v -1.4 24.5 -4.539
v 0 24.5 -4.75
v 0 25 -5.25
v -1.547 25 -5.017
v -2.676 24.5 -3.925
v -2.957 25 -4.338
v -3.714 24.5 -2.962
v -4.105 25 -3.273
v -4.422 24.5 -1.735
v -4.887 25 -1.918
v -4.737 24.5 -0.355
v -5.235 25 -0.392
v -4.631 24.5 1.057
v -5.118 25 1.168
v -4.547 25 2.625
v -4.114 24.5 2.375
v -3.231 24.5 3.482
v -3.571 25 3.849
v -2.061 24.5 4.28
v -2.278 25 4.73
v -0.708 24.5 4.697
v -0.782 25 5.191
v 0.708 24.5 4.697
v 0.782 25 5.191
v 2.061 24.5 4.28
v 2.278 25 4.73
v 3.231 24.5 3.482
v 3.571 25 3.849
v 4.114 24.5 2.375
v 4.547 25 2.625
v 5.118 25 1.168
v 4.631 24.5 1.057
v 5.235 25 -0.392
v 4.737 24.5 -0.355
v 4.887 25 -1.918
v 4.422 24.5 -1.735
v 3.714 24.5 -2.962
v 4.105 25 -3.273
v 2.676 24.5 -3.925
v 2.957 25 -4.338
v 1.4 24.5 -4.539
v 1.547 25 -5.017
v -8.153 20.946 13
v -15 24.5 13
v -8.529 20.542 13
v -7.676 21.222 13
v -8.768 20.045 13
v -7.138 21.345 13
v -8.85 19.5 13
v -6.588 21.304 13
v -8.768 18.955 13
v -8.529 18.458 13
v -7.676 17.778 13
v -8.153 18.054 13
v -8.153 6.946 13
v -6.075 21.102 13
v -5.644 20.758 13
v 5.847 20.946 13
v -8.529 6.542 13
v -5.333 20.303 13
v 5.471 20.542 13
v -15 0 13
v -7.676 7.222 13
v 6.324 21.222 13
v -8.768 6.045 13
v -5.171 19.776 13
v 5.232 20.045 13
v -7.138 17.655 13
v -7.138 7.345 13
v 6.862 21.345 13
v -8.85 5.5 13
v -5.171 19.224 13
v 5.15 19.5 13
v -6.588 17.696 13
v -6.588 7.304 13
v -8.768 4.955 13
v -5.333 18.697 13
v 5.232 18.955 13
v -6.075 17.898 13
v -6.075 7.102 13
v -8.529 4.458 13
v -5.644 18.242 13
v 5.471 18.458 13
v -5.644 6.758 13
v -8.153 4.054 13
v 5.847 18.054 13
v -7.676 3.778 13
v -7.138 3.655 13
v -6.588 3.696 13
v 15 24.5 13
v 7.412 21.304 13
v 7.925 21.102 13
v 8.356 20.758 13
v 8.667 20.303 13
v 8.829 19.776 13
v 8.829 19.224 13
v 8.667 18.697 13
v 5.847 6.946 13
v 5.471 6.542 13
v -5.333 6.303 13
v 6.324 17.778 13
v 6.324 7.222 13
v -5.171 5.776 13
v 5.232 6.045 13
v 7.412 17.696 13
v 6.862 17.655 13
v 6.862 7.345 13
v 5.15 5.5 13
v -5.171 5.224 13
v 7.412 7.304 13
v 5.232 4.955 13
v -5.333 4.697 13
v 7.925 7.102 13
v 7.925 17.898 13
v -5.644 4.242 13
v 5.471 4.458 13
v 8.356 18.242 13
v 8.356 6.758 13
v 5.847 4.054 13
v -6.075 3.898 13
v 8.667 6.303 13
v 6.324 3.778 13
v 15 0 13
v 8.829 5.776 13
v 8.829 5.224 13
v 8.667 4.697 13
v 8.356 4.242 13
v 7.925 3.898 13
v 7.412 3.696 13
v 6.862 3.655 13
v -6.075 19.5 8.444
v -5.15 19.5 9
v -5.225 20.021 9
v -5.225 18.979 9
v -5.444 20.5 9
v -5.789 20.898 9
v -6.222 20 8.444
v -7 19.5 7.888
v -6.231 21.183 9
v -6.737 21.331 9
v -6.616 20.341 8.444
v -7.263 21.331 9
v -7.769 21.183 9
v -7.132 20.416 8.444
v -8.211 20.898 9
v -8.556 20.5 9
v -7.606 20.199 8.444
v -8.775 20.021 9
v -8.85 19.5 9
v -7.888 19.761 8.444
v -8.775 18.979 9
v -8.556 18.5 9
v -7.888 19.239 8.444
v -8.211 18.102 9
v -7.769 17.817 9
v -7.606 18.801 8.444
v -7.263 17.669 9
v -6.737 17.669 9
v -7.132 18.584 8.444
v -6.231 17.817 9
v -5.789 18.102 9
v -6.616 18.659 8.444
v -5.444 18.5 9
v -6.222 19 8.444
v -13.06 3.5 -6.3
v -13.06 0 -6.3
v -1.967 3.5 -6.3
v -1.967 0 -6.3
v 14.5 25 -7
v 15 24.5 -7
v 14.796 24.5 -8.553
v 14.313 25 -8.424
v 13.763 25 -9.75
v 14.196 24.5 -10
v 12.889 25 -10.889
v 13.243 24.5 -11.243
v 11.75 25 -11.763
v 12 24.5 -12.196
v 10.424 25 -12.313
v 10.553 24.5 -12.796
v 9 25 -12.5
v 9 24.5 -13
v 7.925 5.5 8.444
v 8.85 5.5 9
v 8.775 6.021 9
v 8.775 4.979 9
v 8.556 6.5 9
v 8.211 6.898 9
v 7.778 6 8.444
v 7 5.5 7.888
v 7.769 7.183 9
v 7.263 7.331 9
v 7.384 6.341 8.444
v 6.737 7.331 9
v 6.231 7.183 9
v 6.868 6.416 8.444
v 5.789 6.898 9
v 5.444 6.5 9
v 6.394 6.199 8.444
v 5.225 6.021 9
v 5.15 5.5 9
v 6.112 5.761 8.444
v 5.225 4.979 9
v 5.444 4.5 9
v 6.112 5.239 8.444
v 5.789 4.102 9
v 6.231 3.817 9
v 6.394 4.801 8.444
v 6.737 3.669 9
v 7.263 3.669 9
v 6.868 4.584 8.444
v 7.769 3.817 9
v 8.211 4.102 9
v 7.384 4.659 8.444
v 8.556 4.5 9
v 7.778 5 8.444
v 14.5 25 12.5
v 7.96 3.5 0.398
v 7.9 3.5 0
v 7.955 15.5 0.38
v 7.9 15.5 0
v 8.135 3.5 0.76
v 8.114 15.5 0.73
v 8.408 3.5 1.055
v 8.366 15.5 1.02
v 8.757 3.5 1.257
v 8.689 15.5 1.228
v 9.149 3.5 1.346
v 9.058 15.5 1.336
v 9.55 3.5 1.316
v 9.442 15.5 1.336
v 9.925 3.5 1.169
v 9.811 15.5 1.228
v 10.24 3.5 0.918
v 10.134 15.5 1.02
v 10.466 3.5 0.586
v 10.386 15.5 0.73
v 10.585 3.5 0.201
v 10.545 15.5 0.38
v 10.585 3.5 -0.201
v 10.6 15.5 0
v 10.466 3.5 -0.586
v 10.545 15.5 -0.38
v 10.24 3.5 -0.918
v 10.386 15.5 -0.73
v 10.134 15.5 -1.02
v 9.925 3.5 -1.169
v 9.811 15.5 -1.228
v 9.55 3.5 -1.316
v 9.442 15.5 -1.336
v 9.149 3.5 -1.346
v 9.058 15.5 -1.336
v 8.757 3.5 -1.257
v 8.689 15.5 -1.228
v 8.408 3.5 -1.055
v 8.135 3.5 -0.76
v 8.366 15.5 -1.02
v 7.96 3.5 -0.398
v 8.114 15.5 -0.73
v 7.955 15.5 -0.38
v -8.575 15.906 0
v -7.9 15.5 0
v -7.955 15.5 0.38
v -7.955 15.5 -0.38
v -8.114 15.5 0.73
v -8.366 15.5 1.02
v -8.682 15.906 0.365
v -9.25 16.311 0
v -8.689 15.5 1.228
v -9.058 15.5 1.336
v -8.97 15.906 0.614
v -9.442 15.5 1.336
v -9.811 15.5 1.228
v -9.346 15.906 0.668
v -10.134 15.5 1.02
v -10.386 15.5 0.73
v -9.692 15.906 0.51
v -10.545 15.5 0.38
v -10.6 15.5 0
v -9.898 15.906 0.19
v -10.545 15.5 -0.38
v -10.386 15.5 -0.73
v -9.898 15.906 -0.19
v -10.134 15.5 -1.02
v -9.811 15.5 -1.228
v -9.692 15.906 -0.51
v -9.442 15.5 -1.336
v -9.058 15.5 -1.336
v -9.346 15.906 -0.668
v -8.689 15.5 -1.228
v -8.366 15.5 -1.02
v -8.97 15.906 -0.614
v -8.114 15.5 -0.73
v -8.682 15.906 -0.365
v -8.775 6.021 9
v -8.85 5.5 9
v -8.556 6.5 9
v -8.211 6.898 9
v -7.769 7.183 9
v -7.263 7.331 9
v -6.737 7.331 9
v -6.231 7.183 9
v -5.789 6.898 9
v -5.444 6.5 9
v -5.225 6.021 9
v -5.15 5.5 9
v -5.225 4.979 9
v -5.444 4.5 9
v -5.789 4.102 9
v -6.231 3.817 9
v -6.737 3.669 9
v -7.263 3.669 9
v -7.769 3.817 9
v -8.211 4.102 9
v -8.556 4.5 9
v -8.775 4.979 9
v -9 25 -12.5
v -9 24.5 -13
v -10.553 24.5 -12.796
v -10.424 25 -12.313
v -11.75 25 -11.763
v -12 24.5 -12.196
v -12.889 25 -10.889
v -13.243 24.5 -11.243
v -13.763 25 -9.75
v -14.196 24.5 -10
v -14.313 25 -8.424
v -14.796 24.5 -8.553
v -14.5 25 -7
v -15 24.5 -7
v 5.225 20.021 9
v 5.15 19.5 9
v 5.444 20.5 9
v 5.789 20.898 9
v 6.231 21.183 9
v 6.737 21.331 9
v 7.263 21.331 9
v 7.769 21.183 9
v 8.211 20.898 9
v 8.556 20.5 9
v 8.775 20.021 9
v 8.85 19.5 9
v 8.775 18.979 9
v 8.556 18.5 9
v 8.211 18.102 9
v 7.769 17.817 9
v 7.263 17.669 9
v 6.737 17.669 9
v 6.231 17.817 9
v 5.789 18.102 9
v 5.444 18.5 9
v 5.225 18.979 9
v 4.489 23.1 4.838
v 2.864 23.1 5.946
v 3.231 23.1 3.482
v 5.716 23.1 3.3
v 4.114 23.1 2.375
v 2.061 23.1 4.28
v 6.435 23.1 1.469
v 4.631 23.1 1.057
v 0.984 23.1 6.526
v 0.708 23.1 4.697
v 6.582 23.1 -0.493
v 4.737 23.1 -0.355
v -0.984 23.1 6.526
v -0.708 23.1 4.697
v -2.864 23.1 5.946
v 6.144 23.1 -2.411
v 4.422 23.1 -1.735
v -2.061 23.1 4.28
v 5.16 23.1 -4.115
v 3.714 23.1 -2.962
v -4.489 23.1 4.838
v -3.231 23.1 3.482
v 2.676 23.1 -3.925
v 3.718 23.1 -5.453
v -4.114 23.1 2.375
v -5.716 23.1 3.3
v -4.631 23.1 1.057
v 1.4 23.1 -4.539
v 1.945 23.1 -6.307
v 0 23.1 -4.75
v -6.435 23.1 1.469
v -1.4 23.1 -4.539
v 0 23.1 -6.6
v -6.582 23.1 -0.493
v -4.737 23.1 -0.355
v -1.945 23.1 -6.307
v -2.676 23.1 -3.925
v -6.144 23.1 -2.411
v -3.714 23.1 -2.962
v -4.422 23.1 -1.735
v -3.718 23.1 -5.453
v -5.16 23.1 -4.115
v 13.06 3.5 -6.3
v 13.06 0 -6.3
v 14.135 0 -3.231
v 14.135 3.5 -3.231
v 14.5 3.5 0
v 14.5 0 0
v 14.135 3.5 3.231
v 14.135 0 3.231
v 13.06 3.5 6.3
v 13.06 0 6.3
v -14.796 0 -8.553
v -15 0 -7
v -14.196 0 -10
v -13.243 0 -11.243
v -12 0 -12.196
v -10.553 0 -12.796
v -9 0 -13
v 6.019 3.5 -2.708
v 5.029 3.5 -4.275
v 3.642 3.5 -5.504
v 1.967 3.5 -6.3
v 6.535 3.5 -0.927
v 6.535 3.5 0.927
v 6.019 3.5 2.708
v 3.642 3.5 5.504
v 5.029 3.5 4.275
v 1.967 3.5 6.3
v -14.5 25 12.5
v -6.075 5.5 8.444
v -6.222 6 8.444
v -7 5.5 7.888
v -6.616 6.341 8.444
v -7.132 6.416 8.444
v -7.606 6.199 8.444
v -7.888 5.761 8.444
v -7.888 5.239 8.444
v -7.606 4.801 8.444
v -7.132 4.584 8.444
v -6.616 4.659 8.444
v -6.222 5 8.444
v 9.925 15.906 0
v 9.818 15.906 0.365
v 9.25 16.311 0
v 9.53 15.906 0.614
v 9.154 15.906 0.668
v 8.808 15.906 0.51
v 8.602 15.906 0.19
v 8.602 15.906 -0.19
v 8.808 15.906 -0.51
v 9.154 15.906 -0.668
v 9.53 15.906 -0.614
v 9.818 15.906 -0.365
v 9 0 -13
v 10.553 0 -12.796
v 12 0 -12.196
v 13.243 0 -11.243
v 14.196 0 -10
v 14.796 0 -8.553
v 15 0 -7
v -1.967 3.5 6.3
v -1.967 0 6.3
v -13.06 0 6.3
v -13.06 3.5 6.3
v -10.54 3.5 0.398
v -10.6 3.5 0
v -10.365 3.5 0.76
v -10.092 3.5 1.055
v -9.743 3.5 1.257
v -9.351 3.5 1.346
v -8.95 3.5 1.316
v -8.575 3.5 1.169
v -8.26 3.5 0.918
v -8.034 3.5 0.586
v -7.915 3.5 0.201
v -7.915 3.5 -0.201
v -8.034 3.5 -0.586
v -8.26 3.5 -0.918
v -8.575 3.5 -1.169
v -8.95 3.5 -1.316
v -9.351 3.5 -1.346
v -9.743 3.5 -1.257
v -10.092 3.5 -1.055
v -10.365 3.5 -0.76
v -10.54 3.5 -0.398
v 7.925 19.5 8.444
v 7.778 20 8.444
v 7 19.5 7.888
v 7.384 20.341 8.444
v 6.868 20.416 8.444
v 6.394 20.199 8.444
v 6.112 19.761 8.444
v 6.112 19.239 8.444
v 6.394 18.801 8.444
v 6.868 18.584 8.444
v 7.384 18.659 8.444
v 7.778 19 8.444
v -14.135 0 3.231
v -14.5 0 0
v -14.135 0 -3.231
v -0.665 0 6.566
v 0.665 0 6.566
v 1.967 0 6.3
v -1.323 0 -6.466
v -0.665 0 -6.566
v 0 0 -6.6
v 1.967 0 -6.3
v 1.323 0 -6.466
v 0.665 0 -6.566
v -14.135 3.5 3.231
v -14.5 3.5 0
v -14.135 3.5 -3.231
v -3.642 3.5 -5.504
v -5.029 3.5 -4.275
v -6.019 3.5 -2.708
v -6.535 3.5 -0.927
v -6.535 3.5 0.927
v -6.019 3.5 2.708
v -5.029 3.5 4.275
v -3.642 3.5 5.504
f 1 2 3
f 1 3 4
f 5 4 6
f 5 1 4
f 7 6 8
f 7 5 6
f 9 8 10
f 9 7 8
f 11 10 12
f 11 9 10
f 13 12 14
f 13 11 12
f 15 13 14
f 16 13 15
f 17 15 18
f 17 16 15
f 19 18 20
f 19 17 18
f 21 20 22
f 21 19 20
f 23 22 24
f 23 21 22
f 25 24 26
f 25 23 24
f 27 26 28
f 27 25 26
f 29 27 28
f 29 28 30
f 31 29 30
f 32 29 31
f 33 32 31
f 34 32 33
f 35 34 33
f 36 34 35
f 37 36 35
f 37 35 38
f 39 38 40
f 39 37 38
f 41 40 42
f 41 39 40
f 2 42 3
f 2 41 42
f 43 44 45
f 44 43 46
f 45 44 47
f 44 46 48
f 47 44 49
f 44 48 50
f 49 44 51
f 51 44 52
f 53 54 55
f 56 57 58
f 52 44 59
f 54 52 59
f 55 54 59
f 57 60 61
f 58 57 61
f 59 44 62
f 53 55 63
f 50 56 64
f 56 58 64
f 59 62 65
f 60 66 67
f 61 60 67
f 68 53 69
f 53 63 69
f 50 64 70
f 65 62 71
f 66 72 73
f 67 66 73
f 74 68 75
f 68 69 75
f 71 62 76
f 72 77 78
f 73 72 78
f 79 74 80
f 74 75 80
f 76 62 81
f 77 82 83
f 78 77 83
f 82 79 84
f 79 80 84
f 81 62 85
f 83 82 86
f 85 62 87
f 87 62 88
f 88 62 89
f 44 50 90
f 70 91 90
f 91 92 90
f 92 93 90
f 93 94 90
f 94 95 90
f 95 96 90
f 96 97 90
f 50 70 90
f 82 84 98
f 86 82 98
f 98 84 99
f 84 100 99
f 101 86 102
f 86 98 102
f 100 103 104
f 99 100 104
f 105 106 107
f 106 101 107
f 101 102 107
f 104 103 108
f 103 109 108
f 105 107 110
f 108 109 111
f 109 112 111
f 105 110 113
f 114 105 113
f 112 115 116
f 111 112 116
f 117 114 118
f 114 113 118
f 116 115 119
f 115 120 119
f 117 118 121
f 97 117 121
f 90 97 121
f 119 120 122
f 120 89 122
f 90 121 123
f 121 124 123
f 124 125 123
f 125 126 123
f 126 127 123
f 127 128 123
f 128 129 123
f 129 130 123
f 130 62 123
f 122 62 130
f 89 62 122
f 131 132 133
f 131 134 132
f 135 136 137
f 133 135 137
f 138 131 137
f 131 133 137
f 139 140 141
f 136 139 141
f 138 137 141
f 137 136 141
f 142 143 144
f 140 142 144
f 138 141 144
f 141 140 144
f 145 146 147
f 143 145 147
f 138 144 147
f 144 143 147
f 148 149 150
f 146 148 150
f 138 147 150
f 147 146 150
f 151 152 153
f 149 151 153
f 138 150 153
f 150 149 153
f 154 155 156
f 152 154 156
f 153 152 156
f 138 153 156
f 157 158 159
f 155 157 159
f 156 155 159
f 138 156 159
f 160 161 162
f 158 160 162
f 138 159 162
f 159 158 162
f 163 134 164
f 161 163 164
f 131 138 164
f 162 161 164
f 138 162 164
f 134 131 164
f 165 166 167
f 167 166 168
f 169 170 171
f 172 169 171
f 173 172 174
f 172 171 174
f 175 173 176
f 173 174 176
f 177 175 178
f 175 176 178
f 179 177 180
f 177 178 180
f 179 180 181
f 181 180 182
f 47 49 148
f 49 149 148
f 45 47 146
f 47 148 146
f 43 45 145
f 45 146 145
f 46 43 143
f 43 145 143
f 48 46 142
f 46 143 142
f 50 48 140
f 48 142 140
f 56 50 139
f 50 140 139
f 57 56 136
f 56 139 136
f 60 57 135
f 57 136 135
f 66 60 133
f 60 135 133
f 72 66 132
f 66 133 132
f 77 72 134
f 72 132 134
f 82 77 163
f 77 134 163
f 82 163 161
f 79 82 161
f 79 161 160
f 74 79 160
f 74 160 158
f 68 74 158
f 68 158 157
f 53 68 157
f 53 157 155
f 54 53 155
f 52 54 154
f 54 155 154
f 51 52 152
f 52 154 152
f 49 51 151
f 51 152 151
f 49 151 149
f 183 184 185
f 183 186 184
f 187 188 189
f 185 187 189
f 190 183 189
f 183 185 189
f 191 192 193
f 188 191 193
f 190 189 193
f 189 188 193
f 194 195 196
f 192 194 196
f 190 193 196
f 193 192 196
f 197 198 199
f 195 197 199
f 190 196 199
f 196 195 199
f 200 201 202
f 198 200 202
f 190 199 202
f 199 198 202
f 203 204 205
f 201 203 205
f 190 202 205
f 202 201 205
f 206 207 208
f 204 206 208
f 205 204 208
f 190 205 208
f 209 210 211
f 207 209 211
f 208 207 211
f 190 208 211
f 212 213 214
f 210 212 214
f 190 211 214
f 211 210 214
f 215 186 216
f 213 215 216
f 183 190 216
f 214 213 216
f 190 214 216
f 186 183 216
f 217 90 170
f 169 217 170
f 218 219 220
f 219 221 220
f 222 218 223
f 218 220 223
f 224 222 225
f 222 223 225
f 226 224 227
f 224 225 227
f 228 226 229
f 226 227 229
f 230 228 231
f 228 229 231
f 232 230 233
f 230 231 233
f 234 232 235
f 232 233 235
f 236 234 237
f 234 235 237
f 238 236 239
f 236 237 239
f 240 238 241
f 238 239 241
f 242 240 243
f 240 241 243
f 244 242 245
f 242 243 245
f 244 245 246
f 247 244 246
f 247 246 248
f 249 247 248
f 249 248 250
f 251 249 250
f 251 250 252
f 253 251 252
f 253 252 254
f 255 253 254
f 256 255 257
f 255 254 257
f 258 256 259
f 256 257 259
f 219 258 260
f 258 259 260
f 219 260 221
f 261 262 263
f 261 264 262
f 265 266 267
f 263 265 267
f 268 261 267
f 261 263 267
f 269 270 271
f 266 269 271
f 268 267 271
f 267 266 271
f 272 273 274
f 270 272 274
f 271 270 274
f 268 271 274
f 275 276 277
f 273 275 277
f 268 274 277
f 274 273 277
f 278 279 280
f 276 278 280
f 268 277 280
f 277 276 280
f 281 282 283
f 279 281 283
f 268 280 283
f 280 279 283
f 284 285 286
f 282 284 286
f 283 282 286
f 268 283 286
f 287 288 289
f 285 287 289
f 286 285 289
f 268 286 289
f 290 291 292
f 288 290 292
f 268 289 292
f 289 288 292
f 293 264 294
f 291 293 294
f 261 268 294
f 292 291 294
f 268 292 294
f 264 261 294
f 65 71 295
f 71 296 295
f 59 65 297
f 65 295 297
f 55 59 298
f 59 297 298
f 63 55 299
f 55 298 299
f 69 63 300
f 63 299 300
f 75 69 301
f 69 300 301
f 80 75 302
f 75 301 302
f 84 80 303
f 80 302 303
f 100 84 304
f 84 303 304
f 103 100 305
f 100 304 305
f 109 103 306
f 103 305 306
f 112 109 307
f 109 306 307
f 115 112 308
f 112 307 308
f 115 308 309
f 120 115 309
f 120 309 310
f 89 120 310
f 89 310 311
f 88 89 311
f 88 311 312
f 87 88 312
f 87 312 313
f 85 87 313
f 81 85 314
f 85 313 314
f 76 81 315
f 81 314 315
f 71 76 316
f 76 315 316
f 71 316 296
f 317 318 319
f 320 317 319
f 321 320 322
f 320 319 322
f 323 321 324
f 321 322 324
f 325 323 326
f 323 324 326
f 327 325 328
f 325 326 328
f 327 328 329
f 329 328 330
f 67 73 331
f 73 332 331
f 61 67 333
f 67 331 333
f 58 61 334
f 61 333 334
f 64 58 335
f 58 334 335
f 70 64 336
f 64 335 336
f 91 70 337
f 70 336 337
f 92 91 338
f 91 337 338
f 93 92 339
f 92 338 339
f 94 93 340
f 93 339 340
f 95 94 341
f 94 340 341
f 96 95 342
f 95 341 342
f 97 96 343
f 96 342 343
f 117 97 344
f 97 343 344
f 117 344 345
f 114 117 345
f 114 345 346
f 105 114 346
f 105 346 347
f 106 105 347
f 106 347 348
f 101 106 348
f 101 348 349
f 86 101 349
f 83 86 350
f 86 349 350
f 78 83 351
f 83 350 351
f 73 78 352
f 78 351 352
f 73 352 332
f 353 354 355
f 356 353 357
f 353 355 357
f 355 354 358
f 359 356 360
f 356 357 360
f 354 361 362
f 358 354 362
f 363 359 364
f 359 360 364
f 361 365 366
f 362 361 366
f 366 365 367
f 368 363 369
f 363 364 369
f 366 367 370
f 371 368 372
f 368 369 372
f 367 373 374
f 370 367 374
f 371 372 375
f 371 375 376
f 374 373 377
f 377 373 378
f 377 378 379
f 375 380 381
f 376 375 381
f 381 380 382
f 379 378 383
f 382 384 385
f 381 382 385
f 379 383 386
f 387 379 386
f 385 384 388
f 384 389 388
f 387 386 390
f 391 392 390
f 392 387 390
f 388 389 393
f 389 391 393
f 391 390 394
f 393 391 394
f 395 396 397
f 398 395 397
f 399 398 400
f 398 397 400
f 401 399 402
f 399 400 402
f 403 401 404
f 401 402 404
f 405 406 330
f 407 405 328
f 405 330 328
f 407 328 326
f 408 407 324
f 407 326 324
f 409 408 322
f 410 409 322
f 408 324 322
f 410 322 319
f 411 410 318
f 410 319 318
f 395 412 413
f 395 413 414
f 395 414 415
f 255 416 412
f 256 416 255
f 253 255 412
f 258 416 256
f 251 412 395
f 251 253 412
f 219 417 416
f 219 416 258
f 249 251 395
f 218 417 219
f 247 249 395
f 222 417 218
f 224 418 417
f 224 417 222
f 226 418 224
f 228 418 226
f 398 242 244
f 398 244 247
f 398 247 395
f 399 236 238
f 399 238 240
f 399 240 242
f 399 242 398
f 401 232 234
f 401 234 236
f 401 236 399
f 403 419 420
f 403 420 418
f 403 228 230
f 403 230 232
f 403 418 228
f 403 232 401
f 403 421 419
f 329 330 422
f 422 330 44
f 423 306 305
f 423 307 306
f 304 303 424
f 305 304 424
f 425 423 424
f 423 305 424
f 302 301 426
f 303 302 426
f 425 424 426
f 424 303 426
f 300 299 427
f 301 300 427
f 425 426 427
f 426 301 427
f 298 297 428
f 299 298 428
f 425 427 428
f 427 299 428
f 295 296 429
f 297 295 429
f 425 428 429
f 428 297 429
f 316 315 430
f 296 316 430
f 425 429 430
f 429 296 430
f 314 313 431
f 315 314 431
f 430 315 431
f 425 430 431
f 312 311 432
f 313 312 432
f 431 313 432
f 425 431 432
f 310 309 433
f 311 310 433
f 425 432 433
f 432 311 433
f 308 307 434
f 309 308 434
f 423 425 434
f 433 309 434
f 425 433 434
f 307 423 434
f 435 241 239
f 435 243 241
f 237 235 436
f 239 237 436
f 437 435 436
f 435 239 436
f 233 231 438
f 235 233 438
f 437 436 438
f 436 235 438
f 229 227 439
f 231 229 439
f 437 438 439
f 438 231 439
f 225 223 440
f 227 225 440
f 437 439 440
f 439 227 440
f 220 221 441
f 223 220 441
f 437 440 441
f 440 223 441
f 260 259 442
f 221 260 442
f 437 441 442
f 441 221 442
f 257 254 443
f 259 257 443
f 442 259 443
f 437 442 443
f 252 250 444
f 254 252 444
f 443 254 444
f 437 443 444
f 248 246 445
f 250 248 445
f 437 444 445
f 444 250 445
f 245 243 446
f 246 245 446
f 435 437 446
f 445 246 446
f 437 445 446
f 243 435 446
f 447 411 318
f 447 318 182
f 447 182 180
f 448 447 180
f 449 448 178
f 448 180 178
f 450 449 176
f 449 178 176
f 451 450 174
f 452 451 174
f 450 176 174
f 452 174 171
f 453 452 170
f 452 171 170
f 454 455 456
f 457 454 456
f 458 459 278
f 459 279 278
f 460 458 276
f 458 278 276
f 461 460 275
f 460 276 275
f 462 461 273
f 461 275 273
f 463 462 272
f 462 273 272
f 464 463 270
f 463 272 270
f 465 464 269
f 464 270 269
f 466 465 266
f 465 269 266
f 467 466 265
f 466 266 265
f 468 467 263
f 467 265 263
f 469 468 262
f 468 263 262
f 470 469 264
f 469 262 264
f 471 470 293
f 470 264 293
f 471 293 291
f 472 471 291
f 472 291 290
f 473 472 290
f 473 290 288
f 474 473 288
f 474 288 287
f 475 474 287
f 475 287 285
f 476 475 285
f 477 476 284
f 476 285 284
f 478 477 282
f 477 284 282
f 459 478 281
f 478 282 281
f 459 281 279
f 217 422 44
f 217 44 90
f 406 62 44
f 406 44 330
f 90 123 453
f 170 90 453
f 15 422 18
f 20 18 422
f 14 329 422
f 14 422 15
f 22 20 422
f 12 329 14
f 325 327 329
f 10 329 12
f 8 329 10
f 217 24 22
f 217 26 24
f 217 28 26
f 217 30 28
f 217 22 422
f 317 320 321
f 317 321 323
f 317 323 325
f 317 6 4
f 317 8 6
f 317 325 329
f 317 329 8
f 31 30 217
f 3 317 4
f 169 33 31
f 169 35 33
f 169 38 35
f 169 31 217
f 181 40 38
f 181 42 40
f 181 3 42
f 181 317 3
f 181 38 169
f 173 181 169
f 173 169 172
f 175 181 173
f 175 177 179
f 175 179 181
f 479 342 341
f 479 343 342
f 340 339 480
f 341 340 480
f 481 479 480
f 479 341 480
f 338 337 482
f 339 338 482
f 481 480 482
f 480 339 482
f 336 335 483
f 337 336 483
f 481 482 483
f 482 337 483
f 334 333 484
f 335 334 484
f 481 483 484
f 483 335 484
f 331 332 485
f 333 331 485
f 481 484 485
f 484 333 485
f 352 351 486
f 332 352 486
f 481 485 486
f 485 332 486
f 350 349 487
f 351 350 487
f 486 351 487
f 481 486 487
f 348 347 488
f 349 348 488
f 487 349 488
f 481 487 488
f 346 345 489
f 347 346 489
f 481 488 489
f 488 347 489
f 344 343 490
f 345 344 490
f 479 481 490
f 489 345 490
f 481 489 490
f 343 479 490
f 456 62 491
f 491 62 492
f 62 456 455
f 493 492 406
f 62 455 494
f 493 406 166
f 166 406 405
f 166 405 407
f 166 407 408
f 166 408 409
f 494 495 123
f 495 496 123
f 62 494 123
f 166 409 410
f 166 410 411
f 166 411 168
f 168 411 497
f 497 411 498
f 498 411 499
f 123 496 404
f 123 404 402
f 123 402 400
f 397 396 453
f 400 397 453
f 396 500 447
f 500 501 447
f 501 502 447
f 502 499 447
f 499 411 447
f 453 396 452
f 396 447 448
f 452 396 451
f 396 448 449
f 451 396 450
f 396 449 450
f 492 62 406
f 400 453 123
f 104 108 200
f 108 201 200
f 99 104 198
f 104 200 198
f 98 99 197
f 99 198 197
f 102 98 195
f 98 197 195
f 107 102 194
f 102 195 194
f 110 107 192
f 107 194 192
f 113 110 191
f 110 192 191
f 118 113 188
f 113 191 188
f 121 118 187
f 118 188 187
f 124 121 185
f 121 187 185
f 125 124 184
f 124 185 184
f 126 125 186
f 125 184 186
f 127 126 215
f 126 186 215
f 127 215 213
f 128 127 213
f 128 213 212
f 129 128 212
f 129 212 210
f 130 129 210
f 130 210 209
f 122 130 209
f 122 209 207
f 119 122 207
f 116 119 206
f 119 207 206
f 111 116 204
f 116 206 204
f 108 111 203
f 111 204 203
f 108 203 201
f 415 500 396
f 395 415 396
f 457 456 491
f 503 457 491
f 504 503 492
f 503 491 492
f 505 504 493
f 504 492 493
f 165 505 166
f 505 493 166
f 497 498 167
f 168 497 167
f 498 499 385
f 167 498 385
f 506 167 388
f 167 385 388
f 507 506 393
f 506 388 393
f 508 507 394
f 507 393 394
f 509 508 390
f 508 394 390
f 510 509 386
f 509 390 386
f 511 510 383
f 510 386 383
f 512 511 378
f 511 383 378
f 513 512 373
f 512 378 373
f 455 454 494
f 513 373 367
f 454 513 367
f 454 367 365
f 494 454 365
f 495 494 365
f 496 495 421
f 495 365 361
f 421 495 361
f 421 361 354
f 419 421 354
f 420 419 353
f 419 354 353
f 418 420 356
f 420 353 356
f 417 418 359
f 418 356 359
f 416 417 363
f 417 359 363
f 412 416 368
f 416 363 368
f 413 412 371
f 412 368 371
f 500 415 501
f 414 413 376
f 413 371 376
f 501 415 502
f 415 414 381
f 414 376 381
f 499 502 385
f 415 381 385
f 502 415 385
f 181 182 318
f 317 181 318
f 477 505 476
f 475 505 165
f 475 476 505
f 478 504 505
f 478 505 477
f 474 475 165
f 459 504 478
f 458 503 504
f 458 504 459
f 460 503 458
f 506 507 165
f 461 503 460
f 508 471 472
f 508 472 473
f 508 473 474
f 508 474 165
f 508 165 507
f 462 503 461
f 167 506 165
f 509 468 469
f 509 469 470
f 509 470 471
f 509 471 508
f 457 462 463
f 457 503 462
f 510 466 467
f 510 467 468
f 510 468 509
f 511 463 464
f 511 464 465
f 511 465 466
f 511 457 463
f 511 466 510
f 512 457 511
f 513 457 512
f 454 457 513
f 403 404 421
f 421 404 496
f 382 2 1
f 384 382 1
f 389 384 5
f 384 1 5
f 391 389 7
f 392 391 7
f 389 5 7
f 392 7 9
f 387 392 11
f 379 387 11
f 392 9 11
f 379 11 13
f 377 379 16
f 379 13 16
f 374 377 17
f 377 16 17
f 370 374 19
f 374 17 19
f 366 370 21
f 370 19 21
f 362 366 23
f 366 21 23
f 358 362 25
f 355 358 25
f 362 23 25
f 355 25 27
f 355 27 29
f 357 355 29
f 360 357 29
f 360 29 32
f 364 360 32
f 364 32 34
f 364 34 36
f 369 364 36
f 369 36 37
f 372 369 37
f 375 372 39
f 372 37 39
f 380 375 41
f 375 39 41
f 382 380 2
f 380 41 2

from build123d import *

# Parameters (mm, degrees)
SKETCH1_W                      = 30
SKETCH1_H                      = 26
BOSS_EXTRUDE1_DEPTH            = 25
CUT_EXTRUDE3_DEPTH             = 3.5
F_3_7_3_7_DIAMETER_HOLE1_D     = 3.7
F_3_7_3_7_DIAMETER_HOLE1_DEPTH = 4
F_3_7_3_7_DIAMETER_HOLE1_TIP   = 1.111592145
F_2_7_2_7_DIAMETER_HOLE3_D     = 2.7
F_2_7_2_7_DIAMETER_HOLE3_DEPTH = 12
F_2_7_2_7_DIAMETER_HOLE3_TIP   = 0.811161836
FILLET1_R                      = 6
CHAMFER1_SIZE                  = 0.5


with BuildPart() as part:
    # Sketch1 → Boss-Extrude1 (new body)
    with BuildSketch(Plane(origin=(0, 0, 0), x_dir=(1, 0, 0), z_dir=(0, 1, 0))):
        Rectangle(SKETCH1_W, SKETCH1_H)
    extrude(amount=BOSS_EXTRUDE1_DEPTH)

    # Sketch12 → Cut-Extrude3 (cut)
    with BuildSketch(Plane.XZ):
        with BuildLine():
            Line((13.059862174, 6.3), (-13.059862174, 6.3))
            ThreePointArc((-13.059862174, 6.3), (-14.5, 0), (-13.059862174, -6.3))
            Line((-13.059862174, -6.3), (13.059862174, -6.3))
            ThreePointArc((13.059862174, -6.3), (14.5, 0), (13.059862174, 6.3))
        make_face()
    extrude(amount=-CUT_EXTRUDE3_DEPTH, mode=Mode.SUBTRACT)

    # Ø3.7 (3.7) Diameter Hole1
    with Locations(Plane.XY.offset(13)):
        with Locations((7, 5.5), (7, 19.5), (-7, 5.5), (-7, 19.5)):
            Hole(F_3_7_3_7_DIAMETER_HOLE1_D / 2, depth=F_3_7_3_7_DIAMETER_HOLE1_DEPTH)
            with Locations((0, 0, -(F_3_7_3_7_DIAMETER_HOLE1_DEPTH + F_3_7_3_7_DIAMETER_HOLE1_TIP / 2))):  # 118° drill point
                Cone(0, F_3_7_3_7_DIAMETER_HOLE1_D / 2, F_3_7_3_7_DIAMETER_HOLE1_TIP, mode=Mode.SUBTRACT)

    # Sketch13 → Cut-Revolve2 (revolve, cut)
    with BuildSketch(Plane.XY, mode=Mode.PRIVATE) as cut_revolve2_sk:
        Polygon((-6.6, 0), (-6.6, 23.1), (-4.75, 23.1), (-4.75, 25), (0, 25), (0, 0), align=None)
    revolve(cut_revolve2_sk.sketch.rotate(Axis((0, 0, 0), (0, 1, 0)), 270), axis=Axis((0, 0, 0), (0, 1, 0)), mode=Mode.SUBTRACT)

    # Ø2.7 (2.7) Diameter Hole3
    with Locations(Plane.XZ.offset(-3.5)):
        with Locations((-9.25, 0), (9.25, 0)):
            Hole(F_2_7_2_7_DIAMETER_HOLE3_D / 2, depth=F_2_7_2_7_DIAMETER_HOLE3_DEPTH)
            with Locations((0, 0, -(F_2_7_2_7_DIAMETER_HOLE3_DEPTH + F_2_7_2_7_DIAMETER_HOLE3_TIP / 2))):  # 118° drill point
                Cone(0, F_2_7_2_7_DIAMETER_HOLE3_D / 2, F_2_7_2_7_DIAMETER_HOLE3_TIP, mode=Mode.SUBTRACT)

    # Fillet1
    fillet1_edges = [part.edges().sort_by_distance(p)[0] for p in [
        (-15, 12.5, -13),
        (15, 12.5, -13),
    ]]
    fillet(fillet1_edges, radius=FILLET1_R)

    # Chamfer1
    chamfer1_edges = [part.edges().sort_by_distance(p)[0] for p in [
        (15, 25, 3),
        (0, 25, 4.75),
        (0, 25, -13),
        (-15, 25, 3),
        (-13.242640687, 25, -11.242640687),
        (13.242640687, 25, -11.242640687),
        (0, 25, 13),
    ]]
    chamfer(chamfer1_edges, length=CHAMFER1_SIZE)


solid = part.part
